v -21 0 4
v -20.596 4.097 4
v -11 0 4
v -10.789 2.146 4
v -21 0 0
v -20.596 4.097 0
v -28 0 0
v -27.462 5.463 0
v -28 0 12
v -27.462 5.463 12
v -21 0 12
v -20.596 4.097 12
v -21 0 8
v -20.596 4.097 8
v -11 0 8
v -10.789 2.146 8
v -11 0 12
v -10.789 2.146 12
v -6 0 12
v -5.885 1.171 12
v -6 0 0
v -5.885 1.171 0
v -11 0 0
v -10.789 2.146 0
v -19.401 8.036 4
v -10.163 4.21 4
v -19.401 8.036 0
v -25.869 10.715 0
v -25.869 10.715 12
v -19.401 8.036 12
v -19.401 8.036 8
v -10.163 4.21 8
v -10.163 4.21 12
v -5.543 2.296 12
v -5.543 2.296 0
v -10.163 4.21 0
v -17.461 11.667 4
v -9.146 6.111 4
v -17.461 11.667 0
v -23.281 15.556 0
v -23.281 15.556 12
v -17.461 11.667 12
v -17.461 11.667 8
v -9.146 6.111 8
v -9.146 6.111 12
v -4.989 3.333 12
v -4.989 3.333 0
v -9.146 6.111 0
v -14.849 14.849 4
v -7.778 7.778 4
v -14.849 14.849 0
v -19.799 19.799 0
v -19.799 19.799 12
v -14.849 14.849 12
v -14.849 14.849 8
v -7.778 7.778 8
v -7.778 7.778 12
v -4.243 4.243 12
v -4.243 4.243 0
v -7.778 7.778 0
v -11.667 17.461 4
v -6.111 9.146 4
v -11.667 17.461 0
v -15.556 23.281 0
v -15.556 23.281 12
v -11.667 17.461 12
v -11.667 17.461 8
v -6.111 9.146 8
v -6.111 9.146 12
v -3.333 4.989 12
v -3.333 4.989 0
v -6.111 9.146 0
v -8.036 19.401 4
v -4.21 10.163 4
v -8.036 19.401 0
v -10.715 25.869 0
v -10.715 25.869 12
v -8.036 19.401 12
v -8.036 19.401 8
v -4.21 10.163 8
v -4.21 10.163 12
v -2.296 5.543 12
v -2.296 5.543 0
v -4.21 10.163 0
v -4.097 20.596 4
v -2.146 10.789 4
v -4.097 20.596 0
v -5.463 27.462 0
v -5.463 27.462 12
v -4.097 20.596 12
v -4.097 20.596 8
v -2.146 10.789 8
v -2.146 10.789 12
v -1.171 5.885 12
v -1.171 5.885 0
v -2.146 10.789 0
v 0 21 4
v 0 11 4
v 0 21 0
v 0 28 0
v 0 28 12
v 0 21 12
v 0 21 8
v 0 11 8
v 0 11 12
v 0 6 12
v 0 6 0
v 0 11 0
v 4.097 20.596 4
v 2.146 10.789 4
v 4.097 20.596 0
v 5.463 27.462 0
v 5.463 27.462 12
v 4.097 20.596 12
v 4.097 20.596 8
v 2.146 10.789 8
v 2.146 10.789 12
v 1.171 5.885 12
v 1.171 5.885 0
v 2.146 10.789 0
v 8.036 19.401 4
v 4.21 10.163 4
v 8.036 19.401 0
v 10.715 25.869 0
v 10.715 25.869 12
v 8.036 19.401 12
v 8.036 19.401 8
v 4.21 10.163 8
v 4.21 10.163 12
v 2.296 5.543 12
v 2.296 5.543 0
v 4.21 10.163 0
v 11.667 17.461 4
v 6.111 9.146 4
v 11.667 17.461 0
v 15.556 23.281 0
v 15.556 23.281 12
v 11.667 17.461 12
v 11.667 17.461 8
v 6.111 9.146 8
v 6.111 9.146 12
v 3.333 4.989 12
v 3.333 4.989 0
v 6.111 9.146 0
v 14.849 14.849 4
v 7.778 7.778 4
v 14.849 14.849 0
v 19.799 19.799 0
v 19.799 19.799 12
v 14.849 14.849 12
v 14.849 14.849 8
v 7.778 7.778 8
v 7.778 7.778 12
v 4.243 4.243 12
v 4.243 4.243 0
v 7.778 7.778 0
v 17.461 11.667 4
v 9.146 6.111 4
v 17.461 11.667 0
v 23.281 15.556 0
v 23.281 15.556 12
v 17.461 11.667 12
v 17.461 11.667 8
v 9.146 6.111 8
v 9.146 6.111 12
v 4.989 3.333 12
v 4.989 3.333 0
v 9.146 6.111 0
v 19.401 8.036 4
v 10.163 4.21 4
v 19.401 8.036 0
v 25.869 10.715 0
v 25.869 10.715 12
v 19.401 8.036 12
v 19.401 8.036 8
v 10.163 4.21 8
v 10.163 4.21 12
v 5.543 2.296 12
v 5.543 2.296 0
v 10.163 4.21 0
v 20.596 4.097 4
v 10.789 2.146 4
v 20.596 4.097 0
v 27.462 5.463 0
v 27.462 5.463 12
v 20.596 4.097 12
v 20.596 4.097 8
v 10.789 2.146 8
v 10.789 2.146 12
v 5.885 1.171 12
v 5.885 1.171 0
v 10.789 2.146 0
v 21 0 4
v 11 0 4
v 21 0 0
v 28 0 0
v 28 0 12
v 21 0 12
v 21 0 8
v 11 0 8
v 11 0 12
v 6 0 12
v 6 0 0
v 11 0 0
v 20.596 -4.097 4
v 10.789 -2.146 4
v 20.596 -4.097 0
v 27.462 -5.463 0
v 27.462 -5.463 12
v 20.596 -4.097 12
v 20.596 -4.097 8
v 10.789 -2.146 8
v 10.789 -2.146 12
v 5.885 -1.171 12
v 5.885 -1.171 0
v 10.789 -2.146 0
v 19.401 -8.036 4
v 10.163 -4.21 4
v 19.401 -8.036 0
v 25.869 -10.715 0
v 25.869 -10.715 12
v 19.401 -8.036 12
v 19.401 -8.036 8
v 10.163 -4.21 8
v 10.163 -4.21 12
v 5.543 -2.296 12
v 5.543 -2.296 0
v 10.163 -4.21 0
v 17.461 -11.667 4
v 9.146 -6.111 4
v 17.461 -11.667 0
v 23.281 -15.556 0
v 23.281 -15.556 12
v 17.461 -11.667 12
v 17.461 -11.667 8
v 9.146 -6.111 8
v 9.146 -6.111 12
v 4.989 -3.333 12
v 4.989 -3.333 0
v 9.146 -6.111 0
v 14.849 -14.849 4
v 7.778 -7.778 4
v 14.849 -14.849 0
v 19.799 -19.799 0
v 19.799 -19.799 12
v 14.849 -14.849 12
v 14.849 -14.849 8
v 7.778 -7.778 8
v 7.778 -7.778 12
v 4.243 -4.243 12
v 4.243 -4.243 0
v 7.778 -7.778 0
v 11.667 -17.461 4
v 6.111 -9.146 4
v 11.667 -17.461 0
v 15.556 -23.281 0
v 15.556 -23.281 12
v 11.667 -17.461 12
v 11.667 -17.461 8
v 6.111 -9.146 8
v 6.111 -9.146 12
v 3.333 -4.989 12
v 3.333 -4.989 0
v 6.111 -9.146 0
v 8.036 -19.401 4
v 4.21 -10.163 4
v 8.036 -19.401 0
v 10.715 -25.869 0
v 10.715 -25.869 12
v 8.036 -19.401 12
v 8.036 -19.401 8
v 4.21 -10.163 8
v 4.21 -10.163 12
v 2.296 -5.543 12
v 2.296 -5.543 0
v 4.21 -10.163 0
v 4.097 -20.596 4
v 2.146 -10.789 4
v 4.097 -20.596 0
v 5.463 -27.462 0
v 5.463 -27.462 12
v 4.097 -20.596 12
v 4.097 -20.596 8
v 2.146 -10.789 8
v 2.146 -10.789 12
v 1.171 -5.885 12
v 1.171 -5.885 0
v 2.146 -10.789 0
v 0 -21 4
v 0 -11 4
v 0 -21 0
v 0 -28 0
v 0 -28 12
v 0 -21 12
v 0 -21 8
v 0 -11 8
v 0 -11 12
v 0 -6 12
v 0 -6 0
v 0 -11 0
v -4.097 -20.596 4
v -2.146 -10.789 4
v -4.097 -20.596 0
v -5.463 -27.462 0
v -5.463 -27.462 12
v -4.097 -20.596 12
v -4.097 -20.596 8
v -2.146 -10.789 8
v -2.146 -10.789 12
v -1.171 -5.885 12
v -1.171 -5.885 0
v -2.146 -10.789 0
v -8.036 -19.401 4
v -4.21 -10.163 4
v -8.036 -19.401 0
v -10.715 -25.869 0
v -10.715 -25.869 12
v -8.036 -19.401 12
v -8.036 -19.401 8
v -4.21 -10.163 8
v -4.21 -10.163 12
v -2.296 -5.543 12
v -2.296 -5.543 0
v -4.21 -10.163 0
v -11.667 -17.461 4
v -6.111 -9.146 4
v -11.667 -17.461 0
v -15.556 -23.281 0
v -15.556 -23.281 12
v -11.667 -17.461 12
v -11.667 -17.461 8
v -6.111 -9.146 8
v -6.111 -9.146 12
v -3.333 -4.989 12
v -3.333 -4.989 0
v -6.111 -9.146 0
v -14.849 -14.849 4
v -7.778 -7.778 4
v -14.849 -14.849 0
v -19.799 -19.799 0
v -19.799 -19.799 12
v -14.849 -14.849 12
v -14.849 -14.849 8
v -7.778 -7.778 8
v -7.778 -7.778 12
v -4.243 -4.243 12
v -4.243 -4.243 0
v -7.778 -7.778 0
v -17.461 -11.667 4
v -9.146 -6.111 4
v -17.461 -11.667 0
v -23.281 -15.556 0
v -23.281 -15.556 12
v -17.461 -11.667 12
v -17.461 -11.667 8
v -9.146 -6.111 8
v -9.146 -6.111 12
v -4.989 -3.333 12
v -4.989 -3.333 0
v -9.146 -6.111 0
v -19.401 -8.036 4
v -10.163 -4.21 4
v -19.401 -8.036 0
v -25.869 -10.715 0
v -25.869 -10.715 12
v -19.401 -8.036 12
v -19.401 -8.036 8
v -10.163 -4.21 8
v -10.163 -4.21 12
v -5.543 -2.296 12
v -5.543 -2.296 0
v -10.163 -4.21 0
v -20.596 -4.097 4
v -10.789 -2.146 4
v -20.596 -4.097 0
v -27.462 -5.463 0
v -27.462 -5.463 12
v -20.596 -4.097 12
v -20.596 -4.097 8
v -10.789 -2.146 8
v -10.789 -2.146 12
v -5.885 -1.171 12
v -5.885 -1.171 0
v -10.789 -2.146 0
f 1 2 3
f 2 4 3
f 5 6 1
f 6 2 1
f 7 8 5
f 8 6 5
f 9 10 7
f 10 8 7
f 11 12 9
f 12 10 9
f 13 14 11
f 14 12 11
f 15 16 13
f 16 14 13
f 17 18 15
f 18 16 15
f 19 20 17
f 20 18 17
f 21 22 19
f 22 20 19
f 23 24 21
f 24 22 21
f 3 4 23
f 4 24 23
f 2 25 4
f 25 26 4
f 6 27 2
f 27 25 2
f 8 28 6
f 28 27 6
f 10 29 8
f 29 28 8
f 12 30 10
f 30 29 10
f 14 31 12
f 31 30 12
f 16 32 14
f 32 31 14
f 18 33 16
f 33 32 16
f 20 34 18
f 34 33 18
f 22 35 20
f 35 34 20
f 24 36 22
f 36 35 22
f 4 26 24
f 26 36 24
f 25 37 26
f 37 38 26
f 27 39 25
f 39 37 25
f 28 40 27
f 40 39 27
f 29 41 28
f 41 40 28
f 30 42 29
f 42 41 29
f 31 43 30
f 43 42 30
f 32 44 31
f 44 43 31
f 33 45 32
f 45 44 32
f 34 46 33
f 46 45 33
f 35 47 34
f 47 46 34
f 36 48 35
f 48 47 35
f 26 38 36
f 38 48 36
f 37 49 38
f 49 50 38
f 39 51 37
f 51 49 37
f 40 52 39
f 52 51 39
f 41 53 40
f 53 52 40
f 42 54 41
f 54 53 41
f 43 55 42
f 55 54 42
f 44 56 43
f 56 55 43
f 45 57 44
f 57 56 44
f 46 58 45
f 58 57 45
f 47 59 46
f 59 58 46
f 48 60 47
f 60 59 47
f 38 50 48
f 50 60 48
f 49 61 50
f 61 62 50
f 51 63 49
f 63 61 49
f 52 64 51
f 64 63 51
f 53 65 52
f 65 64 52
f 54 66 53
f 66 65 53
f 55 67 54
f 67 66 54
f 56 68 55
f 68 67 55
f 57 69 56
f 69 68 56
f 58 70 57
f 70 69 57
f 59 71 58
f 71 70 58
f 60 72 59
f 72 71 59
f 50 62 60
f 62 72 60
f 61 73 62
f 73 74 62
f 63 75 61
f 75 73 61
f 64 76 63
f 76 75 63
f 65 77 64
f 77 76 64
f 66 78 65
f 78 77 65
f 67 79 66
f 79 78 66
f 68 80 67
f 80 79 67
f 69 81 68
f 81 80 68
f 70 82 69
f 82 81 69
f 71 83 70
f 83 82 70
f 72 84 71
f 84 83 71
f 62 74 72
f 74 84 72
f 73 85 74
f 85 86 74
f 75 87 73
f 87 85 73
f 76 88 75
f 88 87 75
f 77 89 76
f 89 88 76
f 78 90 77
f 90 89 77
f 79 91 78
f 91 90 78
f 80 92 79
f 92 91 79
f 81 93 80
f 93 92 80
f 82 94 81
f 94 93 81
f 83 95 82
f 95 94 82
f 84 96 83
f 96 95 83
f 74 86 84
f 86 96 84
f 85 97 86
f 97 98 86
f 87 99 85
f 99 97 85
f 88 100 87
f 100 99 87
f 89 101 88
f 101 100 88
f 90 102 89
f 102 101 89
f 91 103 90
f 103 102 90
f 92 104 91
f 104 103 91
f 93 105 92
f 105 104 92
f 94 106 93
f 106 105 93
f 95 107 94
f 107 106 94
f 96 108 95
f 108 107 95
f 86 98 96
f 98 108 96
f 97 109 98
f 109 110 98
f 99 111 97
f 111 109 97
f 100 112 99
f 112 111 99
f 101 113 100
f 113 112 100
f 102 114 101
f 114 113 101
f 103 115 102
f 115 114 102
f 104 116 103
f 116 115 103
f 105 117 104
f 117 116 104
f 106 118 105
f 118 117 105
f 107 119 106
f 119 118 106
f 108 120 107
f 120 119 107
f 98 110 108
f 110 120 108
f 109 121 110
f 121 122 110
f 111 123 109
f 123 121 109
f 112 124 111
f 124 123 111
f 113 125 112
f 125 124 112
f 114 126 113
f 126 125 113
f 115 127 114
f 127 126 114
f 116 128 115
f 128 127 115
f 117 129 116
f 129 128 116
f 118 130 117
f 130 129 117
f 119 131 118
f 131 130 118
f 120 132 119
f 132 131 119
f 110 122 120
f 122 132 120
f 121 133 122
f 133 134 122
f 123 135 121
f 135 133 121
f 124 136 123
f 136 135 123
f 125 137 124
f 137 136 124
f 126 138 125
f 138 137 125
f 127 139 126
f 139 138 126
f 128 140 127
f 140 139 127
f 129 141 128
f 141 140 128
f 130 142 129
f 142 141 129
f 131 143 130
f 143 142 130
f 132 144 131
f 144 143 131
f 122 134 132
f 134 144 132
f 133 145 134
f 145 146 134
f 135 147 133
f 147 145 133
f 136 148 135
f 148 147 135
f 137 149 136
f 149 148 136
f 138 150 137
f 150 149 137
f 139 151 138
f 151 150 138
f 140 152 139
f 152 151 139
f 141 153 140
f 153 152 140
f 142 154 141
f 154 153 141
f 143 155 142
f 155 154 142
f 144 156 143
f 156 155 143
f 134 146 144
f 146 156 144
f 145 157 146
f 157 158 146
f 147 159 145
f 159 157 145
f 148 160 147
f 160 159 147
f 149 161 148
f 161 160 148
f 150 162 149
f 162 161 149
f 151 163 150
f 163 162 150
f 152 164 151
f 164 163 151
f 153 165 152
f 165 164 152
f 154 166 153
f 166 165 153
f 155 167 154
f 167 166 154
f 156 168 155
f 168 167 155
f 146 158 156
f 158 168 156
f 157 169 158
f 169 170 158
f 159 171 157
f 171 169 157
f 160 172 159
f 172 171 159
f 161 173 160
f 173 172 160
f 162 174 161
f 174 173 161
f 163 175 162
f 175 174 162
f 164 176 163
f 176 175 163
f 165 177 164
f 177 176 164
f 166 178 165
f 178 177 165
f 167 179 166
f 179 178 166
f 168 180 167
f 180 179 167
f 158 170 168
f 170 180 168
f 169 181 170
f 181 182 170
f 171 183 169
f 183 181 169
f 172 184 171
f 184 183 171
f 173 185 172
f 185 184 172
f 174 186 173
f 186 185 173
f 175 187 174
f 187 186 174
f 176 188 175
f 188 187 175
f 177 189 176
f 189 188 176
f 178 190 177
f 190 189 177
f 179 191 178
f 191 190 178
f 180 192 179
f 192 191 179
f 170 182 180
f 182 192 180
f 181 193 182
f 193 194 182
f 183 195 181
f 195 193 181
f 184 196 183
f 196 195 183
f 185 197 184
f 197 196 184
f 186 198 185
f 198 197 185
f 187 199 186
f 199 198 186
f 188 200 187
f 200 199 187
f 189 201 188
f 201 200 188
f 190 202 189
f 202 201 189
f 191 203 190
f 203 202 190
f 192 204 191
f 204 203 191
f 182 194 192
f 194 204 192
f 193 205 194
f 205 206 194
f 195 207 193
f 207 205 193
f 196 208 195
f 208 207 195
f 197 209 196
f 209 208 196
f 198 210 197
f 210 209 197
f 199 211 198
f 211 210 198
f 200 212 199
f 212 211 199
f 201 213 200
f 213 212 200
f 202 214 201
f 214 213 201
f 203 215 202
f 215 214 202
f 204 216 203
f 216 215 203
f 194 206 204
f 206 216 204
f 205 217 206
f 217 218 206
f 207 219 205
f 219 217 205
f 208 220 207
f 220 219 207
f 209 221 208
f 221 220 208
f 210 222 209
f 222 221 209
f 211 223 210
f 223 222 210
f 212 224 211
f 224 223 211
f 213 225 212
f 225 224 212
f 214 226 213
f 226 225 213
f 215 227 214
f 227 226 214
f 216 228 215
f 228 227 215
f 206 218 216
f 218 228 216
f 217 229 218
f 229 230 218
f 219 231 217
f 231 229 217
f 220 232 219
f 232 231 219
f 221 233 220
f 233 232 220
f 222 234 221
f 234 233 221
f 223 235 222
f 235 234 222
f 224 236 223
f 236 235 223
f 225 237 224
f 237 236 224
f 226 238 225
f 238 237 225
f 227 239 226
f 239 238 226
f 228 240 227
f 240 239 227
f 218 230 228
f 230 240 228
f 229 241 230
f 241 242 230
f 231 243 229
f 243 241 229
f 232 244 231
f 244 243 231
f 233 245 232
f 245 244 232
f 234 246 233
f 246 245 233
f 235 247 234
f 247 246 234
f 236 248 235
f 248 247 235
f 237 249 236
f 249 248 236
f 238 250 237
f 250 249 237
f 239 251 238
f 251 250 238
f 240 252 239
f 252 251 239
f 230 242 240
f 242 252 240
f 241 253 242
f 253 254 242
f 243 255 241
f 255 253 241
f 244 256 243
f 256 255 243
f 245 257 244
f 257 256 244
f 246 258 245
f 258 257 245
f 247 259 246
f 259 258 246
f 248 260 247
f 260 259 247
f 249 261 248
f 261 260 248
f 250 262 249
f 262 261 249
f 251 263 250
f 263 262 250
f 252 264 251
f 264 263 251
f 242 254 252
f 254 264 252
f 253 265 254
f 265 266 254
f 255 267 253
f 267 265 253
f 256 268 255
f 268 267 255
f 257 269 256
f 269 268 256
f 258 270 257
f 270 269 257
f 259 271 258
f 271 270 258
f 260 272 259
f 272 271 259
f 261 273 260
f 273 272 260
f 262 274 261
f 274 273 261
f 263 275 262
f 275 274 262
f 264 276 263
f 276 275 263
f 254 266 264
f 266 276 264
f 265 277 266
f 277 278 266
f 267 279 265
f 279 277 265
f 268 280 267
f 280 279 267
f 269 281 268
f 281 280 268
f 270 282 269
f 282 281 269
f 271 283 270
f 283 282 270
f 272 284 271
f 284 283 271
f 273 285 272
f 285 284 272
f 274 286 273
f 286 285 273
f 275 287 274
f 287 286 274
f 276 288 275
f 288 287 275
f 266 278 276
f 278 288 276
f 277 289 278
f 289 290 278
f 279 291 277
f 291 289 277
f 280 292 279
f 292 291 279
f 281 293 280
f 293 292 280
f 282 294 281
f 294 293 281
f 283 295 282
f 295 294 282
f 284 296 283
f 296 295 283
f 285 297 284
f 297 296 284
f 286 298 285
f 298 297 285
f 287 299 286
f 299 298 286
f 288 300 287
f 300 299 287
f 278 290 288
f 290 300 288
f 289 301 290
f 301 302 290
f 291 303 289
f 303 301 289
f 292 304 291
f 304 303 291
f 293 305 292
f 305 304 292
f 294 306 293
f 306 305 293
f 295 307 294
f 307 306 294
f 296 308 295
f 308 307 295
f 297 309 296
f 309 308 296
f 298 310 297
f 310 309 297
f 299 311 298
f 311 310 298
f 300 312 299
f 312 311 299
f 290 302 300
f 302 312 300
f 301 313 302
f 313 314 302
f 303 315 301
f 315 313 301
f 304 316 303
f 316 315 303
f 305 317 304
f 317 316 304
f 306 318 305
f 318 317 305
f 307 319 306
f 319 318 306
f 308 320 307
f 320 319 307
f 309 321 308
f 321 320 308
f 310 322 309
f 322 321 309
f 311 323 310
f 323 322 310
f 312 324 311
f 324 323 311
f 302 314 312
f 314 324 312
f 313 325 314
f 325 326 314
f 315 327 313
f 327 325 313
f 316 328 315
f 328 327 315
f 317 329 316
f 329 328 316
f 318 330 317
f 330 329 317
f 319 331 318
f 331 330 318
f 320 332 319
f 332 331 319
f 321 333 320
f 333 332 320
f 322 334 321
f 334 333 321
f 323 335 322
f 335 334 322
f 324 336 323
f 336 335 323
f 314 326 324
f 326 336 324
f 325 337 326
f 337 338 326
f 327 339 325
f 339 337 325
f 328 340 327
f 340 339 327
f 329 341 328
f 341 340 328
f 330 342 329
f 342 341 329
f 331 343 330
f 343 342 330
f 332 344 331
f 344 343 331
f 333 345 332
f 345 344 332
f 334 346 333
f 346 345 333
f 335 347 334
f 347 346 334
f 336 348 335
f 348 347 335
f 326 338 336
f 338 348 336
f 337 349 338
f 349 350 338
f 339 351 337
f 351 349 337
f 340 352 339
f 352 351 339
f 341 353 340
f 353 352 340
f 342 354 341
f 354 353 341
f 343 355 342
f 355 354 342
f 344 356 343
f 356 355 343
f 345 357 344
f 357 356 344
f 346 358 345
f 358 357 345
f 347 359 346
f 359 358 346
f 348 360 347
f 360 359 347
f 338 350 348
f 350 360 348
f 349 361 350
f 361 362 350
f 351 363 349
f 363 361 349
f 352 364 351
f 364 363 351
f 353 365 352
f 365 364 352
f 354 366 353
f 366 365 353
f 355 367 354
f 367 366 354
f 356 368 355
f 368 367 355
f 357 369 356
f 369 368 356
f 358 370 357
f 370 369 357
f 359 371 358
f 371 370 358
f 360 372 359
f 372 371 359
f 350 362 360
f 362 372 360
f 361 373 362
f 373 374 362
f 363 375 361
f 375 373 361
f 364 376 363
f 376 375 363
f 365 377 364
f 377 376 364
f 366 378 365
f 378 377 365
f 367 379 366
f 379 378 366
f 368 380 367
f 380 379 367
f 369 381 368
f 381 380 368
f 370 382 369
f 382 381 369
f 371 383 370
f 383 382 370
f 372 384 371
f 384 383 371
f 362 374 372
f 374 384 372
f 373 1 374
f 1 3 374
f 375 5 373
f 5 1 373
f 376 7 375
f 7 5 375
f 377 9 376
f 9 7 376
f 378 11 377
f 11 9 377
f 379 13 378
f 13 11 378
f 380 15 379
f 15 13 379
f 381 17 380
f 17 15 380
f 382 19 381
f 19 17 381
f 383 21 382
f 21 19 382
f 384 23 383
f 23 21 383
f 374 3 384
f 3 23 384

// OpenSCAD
$fn = 32;

// ----------------------------------------------------------------------
// Revolved part: handwheel R28
// ----------------------------------------------------------------------

// --- parameters (mm) ---
bore_r = 6;               // bore radius
rim_r = 28;               // rim radius
rim_w = 7;                // rim axial width
rim_t = 12;               // rim diameter height
hub_r = 11;               // hub radius
web_t = 4;                // web thickness
revolve_angle = 360;      // revolve sweep, degrees

bore_d = 2 * bore_r;
rim_d = 2 * rim_r;
hub_d = 2 * hub_r;

profile = [[6, 0], [11, 0], [11, 4], [21, 4], [21, 0], [28, 0], [28, 12], [21, 12], [21, 8], [11, 8], [11, 12], [6, 12]];  // primary outline, 12 points, counter clockwise

// --- the one profile operation ---
rotate_extrude(angle = revolve_angle) polygon(points = profile);
